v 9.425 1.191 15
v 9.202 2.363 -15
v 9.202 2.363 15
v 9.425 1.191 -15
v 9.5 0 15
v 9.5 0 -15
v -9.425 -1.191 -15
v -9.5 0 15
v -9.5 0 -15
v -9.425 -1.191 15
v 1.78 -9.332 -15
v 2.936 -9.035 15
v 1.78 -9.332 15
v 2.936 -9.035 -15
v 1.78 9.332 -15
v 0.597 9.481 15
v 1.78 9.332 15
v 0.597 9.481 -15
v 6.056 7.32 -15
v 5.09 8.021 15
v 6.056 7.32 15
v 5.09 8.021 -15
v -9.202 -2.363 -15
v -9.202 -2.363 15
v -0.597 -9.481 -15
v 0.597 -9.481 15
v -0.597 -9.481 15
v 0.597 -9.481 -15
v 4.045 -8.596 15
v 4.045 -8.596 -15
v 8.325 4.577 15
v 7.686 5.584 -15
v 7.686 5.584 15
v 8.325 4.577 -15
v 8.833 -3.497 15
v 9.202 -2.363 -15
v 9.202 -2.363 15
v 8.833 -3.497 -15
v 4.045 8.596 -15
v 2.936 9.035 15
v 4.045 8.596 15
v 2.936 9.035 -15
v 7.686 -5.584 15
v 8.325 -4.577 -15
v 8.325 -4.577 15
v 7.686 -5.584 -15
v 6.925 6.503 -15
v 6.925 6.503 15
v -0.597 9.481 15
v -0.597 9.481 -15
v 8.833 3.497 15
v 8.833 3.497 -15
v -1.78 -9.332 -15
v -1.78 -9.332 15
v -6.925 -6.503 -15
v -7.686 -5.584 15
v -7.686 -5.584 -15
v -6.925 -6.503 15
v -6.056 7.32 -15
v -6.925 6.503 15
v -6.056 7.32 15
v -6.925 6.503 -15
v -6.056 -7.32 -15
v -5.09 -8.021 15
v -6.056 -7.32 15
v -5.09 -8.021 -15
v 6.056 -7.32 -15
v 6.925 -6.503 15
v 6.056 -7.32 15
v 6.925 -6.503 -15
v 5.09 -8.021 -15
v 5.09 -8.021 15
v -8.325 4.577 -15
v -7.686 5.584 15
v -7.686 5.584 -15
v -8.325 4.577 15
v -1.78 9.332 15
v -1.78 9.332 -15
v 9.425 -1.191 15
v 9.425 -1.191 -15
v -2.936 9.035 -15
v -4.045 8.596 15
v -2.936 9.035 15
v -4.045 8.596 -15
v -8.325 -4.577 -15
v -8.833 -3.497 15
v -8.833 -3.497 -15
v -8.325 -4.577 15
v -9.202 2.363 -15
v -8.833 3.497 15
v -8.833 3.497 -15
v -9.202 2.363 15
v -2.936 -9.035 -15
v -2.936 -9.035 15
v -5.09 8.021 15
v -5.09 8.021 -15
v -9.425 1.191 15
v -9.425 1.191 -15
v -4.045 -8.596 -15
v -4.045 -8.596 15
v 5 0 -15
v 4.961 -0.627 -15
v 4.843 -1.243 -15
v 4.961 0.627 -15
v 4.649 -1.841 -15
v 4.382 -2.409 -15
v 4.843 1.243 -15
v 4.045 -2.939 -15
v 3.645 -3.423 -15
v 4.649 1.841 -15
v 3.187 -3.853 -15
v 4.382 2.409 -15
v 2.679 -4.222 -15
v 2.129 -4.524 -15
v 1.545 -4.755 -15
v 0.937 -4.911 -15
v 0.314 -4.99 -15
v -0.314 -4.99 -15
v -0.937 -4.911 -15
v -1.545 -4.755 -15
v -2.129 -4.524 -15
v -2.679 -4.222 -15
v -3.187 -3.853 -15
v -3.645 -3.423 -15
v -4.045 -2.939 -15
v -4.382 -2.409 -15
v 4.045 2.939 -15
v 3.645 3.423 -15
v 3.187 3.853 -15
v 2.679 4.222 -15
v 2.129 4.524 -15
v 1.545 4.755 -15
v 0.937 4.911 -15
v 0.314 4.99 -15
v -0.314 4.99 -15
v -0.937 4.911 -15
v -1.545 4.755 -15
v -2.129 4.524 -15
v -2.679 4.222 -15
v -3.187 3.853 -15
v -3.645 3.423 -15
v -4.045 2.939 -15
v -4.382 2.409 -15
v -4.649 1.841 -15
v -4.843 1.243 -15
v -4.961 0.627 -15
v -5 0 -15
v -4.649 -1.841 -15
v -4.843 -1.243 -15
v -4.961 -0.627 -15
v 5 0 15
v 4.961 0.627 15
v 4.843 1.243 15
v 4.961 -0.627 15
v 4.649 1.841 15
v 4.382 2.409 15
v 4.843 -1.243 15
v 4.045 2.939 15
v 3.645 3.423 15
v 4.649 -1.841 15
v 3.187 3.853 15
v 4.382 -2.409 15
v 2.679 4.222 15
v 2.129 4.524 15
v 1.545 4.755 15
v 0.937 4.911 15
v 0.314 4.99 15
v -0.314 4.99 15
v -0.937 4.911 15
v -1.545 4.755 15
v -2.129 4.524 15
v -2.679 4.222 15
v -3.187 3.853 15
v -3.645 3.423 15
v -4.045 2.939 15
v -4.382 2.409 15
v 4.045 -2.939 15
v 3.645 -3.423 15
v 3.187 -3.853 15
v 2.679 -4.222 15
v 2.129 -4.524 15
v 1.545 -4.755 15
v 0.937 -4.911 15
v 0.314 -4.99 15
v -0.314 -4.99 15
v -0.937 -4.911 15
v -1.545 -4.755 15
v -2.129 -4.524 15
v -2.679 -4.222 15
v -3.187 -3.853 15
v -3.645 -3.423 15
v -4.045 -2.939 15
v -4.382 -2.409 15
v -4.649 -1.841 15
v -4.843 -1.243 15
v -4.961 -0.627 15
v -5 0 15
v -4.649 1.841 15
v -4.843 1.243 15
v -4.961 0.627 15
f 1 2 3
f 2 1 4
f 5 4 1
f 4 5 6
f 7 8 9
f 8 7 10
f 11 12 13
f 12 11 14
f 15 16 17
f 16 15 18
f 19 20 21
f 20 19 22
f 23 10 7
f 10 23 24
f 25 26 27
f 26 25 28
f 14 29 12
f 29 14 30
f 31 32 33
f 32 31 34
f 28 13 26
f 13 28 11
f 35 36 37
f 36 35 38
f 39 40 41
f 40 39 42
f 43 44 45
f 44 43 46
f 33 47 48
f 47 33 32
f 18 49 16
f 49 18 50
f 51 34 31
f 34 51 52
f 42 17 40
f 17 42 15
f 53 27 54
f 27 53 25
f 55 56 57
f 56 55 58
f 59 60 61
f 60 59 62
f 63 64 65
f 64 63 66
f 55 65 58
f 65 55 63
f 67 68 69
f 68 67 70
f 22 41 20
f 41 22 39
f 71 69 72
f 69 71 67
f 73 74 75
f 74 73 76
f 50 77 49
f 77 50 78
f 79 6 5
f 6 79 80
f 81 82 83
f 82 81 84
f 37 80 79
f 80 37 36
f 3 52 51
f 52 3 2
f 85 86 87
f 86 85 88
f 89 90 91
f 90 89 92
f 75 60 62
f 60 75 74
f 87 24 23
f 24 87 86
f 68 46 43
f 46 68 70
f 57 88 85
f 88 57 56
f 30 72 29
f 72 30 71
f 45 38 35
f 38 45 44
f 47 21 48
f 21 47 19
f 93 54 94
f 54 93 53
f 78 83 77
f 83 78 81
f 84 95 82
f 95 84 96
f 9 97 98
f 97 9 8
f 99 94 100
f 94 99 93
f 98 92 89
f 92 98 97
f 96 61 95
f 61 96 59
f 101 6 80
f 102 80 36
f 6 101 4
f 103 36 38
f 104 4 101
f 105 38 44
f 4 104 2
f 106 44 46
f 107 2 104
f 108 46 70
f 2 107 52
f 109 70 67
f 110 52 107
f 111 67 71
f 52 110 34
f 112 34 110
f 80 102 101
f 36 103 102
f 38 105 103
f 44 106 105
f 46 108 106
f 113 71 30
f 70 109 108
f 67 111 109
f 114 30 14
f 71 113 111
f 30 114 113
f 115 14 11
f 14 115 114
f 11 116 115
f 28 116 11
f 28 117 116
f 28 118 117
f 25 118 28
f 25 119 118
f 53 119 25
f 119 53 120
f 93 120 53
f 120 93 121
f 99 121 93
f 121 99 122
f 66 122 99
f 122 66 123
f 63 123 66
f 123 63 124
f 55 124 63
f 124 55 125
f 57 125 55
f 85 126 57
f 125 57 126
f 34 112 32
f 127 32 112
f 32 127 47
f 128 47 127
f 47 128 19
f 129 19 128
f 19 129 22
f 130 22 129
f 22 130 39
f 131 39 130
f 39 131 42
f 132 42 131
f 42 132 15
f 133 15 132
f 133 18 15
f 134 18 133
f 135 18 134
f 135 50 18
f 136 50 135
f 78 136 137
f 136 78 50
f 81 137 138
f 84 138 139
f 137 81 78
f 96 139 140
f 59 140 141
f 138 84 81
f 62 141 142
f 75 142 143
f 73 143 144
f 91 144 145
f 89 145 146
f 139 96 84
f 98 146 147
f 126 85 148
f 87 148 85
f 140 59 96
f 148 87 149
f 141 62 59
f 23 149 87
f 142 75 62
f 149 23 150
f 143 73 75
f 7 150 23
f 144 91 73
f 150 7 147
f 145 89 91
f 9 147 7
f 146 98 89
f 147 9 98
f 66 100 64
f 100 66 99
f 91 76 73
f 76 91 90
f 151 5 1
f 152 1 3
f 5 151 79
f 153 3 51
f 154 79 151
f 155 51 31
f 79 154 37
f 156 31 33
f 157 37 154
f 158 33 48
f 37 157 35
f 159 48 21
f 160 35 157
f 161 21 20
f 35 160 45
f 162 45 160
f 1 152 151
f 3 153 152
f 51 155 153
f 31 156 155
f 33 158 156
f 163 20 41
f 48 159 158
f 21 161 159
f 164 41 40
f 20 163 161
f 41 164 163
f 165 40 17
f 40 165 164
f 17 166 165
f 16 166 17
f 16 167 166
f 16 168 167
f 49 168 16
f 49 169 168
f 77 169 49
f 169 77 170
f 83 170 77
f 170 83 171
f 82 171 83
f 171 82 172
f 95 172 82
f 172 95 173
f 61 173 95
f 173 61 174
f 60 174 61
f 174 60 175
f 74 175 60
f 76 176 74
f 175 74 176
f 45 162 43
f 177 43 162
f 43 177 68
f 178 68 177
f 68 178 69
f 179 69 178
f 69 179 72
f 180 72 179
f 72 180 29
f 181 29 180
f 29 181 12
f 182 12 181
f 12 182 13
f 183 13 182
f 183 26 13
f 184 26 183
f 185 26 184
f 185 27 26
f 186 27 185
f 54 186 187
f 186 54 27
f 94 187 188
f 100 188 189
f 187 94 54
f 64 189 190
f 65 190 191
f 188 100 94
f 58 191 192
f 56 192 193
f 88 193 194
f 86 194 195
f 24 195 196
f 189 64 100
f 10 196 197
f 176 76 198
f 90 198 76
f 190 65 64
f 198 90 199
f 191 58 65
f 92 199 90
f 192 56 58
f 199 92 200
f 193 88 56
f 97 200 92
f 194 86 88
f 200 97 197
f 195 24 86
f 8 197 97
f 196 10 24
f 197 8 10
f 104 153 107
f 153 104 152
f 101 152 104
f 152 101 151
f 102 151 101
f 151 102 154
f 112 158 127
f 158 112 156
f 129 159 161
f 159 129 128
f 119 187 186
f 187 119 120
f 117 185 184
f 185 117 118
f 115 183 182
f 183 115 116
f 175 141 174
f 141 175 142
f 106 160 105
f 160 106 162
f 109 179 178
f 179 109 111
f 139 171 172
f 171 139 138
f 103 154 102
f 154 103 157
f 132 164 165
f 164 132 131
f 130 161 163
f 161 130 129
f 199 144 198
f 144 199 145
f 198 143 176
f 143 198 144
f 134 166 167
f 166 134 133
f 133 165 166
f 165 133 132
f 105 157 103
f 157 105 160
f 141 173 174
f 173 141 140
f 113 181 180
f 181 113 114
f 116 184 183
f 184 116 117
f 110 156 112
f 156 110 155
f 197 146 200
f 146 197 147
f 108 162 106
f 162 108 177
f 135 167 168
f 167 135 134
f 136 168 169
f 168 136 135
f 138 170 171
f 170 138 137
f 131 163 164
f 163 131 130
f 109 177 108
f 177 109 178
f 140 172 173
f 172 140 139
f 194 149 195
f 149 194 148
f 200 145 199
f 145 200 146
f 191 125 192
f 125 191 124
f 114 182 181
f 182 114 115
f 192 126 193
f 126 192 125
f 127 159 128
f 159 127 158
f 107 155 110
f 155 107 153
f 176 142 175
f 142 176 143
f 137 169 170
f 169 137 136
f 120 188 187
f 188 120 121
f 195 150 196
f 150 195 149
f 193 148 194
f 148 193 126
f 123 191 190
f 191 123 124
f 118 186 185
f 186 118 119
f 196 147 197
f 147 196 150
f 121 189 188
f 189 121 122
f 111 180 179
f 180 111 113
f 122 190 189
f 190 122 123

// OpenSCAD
$fn = 50;


difference() {
	union() {
		translate(v = [0, 0, -15.0000000000]) {
			cylinder(h = 30, r = 9.5000000000);
		}
	}
	union() {
		translate(v = [0, 0, -100.0000000000]) {
			cylinder(h = 200, r = 5.0000000000);
		}
	}
}
